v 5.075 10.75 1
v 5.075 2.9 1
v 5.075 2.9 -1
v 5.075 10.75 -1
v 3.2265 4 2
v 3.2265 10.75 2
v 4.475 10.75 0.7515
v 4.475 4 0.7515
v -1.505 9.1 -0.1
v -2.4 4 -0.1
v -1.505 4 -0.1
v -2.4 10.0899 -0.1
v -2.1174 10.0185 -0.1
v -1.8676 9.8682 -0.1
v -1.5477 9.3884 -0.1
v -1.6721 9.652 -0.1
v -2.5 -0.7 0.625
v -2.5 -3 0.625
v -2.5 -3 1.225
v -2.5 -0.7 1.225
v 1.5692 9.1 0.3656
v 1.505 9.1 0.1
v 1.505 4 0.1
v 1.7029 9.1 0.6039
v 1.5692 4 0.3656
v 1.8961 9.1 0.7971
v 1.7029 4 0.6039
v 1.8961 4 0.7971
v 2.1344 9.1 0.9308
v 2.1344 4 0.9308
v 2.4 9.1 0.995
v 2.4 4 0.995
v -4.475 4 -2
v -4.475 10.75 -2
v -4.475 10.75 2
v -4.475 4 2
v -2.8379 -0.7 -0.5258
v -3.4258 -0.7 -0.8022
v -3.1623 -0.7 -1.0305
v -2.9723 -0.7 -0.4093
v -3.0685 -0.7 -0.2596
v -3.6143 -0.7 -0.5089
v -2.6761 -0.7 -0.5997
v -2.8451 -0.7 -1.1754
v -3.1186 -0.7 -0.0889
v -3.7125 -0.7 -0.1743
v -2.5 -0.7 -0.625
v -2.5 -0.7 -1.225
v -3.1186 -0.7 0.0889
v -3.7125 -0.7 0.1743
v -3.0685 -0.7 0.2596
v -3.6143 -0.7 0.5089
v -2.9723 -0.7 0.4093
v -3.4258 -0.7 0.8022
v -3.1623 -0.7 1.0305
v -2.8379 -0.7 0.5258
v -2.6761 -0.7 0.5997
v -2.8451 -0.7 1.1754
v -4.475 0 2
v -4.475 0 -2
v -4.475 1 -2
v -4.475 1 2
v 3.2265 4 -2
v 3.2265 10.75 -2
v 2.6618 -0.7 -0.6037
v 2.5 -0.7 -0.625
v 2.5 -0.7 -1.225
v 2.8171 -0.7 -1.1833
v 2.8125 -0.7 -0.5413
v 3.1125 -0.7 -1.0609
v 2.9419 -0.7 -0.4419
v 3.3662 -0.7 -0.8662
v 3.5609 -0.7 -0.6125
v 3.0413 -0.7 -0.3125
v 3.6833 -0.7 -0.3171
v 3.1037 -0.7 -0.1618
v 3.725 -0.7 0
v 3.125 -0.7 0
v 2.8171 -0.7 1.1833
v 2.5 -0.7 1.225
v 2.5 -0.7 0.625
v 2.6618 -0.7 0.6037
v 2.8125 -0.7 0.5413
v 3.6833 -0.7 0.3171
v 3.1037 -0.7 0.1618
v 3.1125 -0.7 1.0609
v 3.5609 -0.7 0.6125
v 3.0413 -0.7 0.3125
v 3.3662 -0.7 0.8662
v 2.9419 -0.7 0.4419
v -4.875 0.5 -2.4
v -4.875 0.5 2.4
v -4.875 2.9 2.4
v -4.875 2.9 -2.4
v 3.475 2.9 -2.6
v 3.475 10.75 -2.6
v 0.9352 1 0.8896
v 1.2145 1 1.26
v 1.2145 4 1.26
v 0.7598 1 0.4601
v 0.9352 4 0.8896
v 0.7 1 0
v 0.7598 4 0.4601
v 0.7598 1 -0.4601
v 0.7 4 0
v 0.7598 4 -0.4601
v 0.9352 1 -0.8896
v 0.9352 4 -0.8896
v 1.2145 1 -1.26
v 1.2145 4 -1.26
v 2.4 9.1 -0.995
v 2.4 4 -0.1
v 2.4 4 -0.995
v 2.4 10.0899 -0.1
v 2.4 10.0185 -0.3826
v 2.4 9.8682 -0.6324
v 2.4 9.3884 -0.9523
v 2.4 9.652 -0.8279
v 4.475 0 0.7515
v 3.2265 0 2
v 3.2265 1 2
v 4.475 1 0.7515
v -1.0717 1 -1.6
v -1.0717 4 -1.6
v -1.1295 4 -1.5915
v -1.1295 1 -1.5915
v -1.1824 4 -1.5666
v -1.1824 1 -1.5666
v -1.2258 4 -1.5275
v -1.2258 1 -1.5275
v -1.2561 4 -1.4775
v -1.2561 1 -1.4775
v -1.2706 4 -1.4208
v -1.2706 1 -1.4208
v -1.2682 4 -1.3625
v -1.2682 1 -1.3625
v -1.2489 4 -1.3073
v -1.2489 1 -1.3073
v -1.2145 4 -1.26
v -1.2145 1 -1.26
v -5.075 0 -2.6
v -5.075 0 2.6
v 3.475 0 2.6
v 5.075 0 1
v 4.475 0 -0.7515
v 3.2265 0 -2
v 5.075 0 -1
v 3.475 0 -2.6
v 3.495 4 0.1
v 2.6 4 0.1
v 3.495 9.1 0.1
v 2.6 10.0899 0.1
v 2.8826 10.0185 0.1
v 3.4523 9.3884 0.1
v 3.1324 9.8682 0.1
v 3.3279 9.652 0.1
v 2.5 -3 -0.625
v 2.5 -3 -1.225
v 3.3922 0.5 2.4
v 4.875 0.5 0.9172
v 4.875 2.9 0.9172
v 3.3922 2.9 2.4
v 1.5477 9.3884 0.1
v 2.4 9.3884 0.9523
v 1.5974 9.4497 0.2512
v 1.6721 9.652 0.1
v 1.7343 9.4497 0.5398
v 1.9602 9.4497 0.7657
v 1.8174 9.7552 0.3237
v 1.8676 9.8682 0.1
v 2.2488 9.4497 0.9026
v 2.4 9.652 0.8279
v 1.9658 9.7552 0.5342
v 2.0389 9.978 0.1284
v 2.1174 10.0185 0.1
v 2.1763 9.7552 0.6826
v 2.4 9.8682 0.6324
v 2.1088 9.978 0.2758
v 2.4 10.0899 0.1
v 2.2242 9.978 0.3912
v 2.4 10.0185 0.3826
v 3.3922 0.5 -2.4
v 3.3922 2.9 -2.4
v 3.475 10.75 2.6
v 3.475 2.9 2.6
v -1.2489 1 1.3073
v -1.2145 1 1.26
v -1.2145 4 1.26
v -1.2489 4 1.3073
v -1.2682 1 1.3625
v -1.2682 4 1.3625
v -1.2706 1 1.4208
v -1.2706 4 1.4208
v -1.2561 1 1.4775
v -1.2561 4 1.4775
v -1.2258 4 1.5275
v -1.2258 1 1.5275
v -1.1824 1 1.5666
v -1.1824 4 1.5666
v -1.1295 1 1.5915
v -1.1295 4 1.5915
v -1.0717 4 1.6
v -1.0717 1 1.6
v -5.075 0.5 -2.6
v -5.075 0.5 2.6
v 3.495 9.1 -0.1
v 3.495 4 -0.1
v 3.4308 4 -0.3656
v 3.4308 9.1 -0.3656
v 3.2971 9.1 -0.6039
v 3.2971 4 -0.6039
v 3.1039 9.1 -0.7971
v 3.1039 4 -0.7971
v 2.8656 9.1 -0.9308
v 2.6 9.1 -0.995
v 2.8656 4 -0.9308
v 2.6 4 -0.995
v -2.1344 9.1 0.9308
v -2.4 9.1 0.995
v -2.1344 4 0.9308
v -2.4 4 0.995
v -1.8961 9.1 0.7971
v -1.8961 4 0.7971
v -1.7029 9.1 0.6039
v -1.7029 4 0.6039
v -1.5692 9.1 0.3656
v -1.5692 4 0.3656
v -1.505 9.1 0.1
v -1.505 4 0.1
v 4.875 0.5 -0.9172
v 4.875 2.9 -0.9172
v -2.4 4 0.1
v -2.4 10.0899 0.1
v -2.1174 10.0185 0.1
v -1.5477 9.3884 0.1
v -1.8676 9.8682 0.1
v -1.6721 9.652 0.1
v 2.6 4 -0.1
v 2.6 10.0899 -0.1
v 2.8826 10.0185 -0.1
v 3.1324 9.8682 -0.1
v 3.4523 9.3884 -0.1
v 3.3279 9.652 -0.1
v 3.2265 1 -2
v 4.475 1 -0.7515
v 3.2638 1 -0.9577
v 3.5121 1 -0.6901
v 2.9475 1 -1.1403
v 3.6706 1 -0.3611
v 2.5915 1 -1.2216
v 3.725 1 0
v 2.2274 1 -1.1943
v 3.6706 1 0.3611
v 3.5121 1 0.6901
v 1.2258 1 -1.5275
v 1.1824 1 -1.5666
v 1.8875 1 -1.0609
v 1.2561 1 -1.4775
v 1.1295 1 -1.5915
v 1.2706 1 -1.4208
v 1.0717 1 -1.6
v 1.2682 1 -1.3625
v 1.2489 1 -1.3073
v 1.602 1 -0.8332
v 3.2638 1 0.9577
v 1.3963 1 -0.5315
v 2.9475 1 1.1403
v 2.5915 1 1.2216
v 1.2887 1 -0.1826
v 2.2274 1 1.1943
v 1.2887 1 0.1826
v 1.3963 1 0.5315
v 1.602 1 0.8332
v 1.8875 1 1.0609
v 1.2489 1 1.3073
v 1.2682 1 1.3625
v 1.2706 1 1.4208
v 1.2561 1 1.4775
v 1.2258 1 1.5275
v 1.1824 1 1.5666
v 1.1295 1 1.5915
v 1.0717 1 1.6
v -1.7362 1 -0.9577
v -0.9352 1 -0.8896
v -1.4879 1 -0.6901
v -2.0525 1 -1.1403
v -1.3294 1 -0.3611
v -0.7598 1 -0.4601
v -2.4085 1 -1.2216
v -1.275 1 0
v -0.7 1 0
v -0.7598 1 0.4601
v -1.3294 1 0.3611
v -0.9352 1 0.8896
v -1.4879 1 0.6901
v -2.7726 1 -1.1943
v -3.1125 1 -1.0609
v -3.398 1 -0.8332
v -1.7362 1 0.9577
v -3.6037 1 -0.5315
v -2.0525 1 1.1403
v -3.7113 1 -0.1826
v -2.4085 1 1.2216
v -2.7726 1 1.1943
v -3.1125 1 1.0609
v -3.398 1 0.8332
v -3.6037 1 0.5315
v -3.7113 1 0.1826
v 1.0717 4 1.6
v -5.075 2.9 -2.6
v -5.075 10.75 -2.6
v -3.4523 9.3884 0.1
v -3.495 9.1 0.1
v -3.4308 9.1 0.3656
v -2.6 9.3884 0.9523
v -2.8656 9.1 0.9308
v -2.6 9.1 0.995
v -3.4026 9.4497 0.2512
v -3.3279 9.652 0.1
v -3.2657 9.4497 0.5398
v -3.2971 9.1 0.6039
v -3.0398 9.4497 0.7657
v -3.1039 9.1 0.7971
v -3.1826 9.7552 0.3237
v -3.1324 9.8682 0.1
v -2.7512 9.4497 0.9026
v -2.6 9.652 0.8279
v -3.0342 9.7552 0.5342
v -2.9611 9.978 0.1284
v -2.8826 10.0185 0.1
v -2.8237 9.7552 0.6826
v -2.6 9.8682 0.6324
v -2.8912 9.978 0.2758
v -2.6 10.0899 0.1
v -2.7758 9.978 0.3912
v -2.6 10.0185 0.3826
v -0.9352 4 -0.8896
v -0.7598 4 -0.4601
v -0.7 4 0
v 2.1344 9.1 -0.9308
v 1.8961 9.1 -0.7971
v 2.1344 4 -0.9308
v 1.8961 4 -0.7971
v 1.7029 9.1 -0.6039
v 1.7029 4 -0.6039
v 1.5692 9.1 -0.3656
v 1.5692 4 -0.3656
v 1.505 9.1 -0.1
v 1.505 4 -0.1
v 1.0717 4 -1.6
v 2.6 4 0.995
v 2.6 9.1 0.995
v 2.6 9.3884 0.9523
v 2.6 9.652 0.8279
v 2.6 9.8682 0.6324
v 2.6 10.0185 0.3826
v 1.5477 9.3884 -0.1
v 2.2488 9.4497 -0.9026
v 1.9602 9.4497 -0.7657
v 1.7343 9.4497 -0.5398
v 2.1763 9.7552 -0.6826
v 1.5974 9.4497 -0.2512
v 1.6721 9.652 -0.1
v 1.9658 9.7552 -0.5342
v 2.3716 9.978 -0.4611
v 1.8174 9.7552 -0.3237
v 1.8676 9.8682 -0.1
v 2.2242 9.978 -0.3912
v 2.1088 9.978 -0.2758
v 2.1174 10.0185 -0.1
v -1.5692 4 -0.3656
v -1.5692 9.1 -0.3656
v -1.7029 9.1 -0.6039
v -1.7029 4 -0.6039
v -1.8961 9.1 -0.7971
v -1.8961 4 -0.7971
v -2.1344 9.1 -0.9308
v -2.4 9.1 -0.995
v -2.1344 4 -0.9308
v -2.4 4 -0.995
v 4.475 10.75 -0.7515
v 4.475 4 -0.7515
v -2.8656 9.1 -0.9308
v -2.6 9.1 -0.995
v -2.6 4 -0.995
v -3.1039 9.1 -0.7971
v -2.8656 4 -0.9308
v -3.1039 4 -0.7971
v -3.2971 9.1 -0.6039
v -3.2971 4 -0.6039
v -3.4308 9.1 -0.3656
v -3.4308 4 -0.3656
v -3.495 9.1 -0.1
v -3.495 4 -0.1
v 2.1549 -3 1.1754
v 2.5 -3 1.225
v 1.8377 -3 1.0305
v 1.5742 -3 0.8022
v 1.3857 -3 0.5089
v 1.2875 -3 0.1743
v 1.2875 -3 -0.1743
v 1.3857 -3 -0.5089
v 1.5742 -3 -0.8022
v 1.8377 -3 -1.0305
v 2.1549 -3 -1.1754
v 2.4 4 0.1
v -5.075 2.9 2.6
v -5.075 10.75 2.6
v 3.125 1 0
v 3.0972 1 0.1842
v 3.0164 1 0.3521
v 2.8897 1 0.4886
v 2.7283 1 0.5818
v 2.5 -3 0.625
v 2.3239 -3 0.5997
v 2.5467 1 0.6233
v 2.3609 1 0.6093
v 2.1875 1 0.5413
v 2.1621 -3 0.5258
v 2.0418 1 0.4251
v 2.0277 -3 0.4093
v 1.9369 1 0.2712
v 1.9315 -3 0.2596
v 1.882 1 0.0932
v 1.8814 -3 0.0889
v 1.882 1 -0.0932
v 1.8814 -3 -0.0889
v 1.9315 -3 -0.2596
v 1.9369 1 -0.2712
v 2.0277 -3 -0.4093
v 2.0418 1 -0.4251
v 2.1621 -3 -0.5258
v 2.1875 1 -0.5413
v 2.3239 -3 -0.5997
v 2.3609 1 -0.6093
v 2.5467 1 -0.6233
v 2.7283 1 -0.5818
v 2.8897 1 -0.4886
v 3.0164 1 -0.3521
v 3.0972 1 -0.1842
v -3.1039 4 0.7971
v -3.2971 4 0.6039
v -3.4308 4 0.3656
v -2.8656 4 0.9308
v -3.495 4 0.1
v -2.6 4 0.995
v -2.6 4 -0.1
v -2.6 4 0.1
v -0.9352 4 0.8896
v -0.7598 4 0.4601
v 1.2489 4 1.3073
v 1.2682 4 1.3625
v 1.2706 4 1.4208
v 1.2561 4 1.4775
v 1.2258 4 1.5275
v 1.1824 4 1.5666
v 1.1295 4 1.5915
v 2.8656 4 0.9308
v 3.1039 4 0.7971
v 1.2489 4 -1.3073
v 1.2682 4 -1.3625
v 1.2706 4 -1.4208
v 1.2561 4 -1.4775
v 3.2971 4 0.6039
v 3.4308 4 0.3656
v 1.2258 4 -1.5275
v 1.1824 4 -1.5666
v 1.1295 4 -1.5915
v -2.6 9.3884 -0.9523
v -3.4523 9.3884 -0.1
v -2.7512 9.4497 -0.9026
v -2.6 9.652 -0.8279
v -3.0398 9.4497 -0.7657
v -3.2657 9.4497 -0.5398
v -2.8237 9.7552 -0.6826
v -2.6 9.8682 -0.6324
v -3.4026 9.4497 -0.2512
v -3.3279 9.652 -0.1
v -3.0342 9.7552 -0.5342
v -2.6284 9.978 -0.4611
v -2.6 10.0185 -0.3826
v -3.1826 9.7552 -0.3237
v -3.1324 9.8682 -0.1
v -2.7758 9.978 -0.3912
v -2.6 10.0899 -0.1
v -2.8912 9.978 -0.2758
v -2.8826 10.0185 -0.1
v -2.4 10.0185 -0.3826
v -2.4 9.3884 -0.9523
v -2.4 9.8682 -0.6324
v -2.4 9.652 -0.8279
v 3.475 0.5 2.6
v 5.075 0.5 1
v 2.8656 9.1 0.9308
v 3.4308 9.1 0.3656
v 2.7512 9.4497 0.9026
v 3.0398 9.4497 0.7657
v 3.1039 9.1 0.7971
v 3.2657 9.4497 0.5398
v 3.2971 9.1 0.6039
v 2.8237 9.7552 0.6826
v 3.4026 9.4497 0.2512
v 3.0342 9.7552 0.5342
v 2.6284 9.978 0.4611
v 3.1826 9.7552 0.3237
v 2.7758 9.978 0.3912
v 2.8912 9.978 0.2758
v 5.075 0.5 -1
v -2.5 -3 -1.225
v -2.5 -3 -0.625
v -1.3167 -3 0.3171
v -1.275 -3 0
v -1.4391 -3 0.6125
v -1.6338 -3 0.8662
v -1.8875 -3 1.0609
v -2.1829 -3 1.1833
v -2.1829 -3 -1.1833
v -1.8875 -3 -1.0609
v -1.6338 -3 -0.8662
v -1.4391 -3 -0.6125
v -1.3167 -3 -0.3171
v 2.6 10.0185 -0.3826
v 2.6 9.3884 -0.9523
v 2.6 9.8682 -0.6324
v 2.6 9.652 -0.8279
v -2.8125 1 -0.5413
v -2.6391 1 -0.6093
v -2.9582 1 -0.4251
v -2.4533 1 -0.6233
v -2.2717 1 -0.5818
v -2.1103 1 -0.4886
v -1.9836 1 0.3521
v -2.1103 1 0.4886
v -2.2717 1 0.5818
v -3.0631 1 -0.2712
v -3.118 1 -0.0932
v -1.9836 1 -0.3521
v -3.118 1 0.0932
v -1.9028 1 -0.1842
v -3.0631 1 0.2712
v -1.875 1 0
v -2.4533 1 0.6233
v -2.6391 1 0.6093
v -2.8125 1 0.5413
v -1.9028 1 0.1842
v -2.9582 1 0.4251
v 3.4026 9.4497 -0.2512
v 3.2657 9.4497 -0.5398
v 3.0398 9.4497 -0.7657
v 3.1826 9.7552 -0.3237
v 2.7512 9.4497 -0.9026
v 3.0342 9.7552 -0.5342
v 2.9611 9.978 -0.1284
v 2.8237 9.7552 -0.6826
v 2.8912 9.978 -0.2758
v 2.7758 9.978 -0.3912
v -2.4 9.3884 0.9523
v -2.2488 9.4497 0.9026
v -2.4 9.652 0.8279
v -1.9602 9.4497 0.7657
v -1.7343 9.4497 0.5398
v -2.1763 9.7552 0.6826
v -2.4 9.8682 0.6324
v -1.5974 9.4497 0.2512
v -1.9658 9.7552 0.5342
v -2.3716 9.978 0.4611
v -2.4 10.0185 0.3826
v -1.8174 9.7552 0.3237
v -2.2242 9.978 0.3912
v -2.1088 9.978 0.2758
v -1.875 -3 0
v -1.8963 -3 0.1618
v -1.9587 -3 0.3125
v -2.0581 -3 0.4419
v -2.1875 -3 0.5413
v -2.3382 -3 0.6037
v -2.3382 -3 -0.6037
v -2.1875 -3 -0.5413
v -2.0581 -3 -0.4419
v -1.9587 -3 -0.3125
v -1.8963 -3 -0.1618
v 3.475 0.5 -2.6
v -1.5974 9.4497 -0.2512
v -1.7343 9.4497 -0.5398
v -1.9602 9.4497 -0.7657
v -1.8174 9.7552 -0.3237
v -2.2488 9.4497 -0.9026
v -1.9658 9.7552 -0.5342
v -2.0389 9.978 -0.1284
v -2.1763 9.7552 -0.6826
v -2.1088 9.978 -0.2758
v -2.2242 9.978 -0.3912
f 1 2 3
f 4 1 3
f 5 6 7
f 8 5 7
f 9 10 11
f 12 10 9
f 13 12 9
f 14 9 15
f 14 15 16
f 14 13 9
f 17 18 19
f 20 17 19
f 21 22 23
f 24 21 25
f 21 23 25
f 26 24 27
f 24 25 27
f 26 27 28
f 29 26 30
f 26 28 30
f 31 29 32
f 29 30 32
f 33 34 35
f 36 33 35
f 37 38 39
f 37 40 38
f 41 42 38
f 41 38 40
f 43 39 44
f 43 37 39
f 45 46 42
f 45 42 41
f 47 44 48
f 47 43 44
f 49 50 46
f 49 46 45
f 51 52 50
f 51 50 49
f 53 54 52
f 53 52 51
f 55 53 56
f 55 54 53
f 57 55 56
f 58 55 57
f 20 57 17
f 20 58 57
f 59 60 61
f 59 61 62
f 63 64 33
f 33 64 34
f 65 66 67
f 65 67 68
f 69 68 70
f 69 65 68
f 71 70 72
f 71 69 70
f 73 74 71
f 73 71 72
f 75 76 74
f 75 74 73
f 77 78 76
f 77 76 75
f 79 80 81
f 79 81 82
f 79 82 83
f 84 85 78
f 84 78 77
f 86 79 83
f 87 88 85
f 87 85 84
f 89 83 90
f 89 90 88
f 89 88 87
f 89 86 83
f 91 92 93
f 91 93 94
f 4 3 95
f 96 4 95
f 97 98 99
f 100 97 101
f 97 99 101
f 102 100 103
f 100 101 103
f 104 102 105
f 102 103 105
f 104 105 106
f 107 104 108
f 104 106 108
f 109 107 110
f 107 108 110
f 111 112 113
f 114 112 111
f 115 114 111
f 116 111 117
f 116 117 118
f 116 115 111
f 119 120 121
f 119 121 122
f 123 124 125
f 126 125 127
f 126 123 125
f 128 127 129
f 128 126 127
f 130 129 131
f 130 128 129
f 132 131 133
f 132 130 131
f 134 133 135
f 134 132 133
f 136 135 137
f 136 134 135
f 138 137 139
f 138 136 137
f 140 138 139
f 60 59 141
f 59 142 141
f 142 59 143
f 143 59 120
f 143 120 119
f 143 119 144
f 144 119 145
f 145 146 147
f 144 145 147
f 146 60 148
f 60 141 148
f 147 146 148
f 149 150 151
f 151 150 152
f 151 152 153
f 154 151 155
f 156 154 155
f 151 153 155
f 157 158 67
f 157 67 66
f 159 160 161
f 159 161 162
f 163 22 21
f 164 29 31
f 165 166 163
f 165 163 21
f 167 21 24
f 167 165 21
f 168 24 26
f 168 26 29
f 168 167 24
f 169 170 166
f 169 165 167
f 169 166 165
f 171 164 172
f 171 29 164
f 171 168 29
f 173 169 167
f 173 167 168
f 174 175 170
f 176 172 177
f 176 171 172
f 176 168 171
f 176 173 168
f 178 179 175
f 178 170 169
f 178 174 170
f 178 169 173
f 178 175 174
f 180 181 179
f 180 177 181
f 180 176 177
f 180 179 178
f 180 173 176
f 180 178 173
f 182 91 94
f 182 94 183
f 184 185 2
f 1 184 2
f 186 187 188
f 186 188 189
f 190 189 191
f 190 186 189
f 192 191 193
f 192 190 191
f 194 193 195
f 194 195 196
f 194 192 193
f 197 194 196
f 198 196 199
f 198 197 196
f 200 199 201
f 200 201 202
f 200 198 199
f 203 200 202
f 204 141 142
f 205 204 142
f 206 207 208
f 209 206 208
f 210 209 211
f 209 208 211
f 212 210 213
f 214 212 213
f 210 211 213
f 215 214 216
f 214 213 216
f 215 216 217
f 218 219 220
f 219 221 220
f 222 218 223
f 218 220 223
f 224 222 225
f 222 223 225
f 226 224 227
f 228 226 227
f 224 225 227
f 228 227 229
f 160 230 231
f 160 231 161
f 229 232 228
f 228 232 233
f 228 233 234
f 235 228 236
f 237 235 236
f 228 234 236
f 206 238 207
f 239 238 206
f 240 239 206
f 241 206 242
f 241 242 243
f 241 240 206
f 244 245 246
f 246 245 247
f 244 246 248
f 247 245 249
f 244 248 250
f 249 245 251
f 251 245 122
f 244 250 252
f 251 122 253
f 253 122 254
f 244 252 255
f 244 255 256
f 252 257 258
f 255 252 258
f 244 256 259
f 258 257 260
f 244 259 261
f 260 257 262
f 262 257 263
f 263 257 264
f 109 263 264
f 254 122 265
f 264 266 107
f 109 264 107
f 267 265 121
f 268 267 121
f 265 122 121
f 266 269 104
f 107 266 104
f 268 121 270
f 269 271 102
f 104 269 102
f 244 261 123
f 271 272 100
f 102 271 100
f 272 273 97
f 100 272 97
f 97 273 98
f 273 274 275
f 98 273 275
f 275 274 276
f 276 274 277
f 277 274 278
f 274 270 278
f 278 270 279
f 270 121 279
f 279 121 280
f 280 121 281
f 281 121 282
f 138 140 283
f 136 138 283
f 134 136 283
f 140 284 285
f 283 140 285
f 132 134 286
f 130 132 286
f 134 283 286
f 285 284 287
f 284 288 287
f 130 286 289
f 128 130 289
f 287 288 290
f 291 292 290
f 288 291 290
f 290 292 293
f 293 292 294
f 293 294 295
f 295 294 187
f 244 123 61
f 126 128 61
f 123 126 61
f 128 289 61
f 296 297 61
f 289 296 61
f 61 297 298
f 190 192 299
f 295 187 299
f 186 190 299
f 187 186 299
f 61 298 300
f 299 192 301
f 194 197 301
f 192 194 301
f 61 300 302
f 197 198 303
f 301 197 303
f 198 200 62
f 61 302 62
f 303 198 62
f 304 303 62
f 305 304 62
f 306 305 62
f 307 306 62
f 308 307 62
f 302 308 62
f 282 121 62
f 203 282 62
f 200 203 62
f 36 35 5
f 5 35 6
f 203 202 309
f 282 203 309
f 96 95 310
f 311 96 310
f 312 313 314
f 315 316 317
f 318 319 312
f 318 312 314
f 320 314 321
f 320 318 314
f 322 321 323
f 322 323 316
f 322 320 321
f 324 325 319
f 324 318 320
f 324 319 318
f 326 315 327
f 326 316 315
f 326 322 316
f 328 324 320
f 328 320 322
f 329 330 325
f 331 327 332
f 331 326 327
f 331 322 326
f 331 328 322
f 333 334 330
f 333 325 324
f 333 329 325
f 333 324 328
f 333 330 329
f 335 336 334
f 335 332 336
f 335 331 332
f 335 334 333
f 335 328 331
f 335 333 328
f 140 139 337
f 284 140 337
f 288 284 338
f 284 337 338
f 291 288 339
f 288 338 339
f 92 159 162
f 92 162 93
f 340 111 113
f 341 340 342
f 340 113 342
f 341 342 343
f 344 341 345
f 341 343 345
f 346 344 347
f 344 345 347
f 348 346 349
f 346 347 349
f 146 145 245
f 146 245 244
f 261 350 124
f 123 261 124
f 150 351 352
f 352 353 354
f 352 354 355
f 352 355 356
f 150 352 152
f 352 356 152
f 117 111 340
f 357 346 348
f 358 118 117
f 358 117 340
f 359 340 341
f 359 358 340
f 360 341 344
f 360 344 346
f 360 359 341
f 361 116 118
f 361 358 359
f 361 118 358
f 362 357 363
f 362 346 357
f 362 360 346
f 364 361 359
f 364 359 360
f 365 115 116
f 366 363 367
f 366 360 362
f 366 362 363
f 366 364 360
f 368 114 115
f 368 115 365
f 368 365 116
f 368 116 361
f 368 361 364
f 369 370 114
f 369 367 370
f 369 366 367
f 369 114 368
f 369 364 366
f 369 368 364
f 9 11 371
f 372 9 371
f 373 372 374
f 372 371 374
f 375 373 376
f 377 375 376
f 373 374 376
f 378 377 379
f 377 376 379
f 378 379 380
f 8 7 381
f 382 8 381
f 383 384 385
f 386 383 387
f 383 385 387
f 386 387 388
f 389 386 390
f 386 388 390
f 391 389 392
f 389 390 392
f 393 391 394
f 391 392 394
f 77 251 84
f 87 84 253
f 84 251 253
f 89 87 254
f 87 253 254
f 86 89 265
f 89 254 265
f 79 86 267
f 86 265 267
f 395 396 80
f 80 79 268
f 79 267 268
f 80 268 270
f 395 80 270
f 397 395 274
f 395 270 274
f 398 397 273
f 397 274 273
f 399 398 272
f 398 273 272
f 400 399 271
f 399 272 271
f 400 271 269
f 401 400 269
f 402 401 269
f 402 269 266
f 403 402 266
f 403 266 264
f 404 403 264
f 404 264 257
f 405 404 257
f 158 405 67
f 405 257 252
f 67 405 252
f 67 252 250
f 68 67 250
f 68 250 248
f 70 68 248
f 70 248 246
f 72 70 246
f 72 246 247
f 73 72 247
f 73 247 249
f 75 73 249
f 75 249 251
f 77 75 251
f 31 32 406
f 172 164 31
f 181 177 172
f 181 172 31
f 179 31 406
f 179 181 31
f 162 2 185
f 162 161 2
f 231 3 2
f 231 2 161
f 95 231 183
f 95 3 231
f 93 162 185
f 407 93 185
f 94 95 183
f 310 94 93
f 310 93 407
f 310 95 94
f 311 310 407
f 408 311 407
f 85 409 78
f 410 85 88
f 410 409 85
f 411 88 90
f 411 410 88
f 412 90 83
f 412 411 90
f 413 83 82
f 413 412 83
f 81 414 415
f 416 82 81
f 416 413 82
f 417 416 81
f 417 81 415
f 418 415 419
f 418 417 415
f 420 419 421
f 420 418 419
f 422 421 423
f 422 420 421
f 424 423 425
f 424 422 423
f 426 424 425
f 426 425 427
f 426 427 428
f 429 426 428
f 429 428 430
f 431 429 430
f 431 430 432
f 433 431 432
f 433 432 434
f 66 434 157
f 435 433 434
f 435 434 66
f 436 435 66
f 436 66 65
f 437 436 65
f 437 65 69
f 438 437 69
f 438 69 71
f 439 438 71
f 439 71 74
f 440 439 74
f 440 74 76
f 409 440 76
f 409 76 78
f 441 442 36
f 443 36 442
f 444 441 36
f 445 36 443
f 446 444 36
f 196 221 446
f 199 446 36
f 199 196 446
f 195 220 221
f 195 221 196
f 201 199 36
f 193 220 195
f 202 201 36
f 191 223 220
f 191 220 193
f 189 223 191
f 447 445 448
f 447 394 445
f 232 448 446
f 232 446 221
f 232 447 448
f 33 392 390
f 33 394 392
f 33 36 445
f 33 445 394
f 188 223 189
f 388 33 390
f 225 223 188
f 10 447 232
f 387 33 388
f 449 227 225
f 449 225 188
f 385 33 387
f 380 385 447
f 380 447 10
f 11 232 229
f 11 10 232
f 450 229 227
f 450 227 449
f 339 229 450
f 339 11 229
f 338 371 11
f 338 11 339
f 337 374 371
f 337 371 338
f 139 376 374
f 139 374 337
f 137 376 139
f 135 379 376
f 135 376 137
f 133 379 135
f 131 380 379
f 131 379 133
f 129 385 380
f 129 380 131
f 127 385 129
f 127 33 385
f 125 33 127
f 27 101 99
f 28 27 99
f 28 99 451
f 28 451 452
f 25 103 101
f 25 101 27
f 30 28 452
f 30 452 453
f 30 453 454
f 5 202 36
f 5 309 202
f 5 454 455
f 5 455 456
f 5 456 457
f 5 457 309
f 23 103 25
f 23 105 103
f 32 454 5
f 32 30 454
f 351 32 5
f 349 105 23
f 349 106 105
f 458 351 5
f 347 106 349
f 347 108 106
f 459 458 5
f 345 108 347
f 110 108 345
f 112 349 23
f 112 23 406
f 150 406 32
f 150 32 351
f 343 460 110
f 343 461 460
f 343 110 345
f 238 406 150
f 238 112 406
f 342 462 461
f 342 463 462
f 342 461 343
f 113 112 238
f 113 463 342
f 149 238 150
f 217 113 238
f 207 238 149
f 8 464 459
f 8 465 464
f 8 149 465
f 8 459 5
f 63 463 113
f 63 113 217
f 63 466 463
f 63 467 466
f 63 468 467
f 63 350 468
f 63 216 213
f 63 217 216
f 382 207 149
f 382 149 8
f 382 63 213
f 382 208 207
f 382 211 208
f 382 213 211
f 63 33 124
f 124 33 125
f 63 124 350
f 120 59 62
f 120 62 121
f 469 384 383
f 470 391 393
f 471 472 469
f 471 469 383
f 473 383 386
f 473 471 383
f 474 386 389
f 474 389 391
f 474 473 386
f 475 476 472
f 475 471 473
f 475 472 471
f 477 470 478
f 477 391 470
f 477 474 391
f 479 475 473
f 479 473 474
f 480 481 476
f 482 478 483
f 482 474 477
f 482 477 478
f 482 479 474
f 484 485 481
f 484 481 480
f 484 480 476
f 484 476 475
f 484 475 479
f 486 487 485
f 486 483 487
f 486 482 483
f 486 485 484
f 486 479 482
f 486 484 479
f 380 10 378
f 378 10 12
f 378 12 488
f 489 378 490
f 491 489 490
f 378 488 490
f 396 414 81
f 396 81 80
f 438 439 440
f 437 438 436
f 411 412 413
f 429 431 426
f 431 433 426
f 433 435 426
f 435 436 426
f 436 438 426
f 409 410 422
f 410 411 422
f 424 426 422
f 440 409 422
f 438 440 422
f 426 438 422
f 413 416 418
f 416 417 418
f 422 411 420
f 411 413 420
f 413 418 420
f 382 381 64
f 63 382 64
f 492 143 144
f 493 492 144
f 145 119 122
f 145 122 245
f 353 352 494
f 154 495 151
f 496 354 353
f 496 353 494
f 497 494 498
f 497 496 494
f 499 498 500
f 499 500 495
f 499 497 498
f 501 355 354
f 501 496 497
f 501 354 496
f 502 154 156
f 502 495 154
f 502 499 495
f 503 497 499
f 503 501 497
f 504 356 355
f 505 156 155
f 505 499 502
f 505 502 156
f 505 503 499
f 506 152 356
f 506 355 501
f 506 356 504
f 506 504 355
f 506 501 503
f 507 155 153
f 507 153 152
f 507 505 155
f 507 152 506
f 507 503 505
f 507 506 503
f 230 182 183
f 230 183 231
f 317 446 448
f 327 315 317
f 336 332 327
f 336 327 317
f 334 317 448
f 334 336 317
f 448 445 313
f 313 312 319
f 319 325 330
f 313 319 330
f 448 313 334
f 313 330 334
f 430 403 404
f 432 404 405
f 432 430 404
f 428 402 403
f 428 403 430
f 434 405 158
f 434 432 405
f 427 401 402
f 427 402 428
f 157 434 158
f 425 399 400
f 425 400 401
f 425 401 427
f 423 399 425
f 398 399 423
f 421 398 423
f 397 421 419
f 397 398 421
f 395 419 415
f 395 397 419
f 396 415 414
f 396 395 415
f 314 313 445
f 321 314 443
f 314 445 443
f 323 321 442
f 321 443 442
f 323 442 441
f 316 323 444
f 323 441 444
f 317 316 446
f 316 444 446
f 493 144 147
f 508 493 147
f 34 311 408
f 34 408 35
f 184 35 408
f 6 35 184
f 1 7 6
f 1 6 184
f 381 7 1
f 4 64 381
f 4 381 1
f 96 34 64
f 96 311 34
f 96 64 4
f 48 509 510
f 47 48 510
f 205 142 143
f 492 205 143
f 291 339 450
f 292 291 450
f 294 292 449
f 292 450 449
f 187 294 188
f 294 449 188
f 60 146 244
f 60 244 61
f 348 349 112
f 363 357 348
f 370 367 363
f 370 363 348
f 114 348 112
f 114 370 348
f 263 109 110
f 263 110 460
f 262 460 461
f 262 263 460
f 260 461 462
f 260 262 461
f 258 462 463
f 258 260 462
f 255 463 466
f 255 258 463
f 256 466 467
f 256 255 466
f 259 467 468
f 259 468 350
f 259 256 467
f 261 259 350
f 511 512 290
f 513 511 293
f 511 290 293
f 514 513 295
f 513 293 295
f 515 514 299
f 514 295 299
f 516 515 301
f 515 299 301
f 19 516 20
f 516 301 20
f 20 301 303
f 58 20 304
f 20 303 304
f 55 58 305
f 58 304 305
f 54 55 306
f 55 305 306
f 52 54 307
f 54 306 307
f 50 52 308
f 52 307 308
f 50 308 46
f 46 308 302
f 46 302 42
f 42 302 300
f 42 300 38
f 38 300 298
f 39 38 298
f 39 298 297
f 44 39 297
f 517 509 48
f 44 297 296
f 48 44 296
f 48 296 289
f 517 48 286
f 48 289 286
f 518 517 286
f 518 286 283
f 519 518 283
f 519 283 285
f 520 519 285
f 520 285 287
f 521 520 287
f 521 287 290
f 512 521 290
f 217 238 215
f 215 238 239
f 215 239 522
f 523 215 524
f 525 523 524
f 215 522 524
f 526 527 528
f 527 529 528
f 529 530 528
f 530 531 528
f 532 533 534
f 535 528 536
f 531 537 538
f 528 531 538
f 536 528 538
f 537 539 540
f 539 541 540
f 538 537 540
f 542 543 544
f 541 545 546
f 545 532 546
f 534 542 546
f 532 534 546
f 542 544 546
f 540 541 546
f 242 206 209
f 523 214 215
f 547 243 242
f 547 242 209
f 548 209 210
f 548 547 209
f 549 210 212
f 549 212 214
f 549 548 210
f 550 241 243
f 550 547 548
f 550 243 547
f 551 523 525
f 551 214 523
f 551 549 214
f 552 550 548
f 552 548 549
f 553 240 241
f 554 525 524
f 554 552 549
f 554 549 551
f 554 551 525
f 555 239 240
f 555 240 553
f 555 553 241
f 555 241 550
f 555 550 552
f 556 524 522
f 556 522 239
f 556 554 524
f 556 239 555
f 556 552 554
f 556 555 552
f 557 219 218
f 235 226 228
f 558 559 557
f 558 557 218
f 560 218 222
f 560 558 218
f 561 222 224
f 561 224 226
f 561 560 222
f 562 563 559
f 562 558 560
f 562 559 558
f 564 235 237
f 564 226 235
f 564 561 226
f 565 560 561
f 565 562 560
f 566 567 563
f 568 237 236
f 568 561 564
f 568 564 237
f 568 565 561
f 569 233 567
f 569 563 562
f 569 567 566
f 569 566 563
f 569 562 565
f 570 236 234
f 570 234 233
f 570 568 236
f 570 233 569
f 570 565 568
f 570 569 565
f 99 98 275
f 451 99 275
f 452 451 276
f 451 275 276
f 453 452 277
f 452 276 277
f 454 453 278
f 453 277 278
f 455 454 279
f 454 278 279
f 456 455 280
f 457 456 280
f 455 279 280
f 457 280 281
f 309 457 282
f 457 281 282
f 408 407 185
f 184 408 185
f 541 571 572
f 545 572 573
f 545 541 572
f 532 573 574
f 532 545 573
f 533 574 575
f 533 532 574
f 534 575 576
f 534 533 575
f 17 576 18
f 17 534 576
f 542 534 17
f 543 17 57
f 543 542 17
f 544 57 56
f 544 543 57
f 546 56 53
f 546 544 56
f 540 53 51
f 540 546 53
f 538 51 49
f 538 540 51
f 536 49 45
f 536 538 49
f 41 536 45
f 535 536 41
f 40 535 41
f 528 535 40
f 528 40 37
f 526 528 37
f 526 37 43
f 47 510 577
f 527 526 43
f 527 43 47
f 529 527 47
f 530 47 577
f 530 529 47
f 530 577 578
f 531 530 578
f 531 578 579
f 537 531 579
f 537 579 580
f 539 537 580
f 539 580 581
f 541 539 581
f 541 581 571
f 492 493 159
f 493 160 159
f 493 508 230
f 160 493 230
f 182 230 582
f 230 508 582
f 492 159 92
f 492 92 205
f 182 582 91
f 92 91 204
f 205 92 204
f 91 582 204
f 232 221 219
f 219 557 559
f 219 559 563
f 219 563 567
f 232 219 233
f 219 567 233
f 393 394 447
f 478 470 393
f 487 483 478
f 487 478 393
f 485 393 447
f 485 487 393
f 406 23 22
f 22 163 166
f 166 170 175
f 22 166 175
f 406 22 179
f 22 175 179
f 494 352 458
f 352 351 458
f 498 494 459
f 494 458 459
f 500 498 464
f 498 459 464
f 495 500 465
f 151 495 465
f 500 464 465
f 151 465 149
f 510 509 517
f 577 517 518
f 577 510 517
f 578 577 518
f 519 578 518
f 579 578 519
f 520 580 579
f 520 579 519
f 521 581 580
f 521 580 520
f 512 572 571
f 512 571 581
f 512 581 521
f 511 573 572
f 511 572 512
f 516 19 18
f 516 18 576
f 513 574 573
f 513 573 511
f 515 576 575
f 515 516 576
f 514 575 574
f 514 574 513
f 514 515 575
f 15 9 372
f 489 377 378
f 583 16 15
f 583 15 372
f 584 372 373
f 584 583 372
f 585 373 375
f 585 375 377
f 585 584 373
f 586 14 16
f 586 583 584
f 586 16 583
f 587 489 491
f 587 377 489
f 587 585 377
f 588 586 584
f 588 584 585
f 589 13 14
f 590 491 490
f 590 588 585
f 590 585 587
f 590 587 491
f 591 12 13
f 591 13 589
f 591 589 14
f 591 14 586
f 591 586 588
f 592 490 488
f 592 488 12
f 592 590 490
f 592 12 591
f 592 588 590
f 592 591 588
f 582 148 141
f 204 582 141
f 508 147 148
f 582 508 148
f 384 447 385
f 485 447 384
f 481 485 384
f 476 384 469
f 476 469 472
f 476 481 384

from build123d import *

# Parameters (mm, degrees)
SHAPE_DEPTH         = 10.75
CUT_EXTRUDE1_DEPTH  = 6.75
CUT_EXTRUDE2_REACH  = 6
FILLET1_R           = 0.2
SKETCH4_R           = 1
BOSS_EXTRUDE2_DEPTH = 6.1
FILLET2_R           = 1
SKETCH5_W           = 0.2
SKETCH5_H           = 2
SKETCH5_W_2         = 2
SKETCH5_H_2         = 0.2
CUT_EXTRUDE3_DEPTH  = 6.75
CUT_EXTRUDE4_DEPTH  = 2.4
CUT_EXTRUDE5_DEPTH  = 1
SKETCH7_R           = 1.225
SKETCH7_R_2         = 0.625
BOSS_EXTRUDE3_DEPTH = 4
SKETCH9_W           = 1.225
SKETCH9_H           = 2.45
CUT_EXTRUDE6_DEPTH  = 2.3


with BuildPart() as part:
    # Sketch1 → Shape (new body)
    with BuildSketch(Plane(origin=(0, 0, 0), x_dir=(1, 0, 0), z_dir=(0, 1, 0))):
        Polygon((5.075, -1), (5.075, 1), (3.475, 2.6), (-5.075, 2.6), (-5.075, -2.6), (3.475, -2.6), align=None)
    extrude(amount=SHAPE_DEPTH)

    # Sketch2 → Cut-Extrude1 (cut)
    with BuildSketch(Plane(origin=(0, 10.75, 0), x_dir=(1, 0, 0), z_dir=(0, 1, 0))):
        Polygon((3.226471863, -2), (4.475, -0.751471863), (4.475, 0.751471863), (3.226471863, 2), (-4.475, 2), (-4.475, -2), align=None)
    extrude(amount=-CUT_EXTRUDE1_DEPTH, mode=Mode.SUBTRACT)

    # Sketch3 → Cut-Extrude2 (cut, up to next)
    with BuildSketch(Plane(origin=(0, 4, 0), x_dir=(1, 0, 0), z_dir=(0, 1, 0)), mode=Mode.PRIVATE) as cut_extrude2_sk1:
        with BuildLine():
            Line((-1.675378875, -1.6), (1.675378875, -1.6))
            ThreePointArc((1.675378875, -1.6), (0.7, 0), (1.675378875, 1.6))
            Line((1.675378875, 1.6), (-1.675378875, 1.6))
            ThreePointArc((-1.675378875, 1.6), (-0.963068312, 0.936931688), (-0.7, 0))
            ThreePointArc((-0.7, 0), (-0.963068312, -0.936931688), (-1.675378875, -1.6))
        make_face()
    cut_extrude2_tool1 = extrude(cut_extrude2_sk1.sketch, amount=-CUT_EXTRUDE2_REACH, mode=Mode.PRIVATE) & part.part
    add(cut_extrude2_tool1.solids().sort_by_distance((0, 4, 0))[0], mode=Mode.SUBTRACT)

    # Fillet1
    fillet1_edges = [part.edges().sort_by_distance(p)[0] for p in [
        (1.675378875, 2, 1.6),
        (-1.675378875, 2, 1.6),
        (-1.675378875, 2, -1.6),
        (1.675378875, 2, -1.6),
    ]]
    fillet(fillet1_edges, radius=FILLET1_R)

    # Sketch4 → Boss-Extrude2 (add)
    with BuildSketch(Plane(origin=(0, 4, 0), x_dir=(1, 0, 0), z_dir=(0, 1, 0))):
        with Locations((-2.5, 0)):
            Circle(SKETCH4_R)
        with Locations((2.5, 0)):
            Circle(SKETCH4_R)
    extrude(amount=BOSS_EXTRUDE2_DEPTH)

    # Fillet2
    fillet2_edges = [part.edges().sort_by_distance(p)[0] for p in [
        (-3.5, 10.1, 0),
        (1.5, 10.1, 0),
    ]]
    fillet(fillet2_edges, radius=FILLET2_R)

    # Sketch5 → Cut-Extrude3 (cut)
    with BuildSketch(Plane(origin=(0, 10.75, 0), x_dir=(1, 0, 0), z_dir=(0, 1, 0))):
        with Locations((-2.5, 0)):
            Rectangle(SKETCH5_W, SKETCH5_H)
        with Locations((-2.5, 0)):
            Rectangle(SKETCH5_W_2, SKETCH5_H_2)
        with Locations((2.5, 0)):
            Rectangle(SKETCH5_W_2, SKETCH5_H_2)
        with Locations((2.5, 0)):
            Rectangle(SKETCH5_W, SKETCH5_H)
    extrude(amount=-CUT_EXTRUDE3_DEPTH, mode=Mode.SUBTRACT)

    # Sketch6 → Cut-Extrude4 (cut)
    with BuildSketch(Plane(origin=(0, 0.5, 0), x_dir=(-1, 0, 0), z_dir=(0, -1, 0))):
        Polygon((-5.075, -1), (-3.475, -2.6), (5.075, -2.6), (5.075, 2.6), (-3.475, 2.6), (-5.075, 1), align=None)
        Polygon((-4.875, -0.917157288), (-3.392157288, -2.4), (4.875, -2.4), (4.875, 2.4), (-3.392157288, 2.4), (-4.875, 0.917157288), align=None, mode=Mode.SUBTRACT)
    extrude(amount=-CUT_EXTRUDE4_DEPTH, mode=Mode.SUBTRACT)

    # Sketch8 → Cut-Extrude5 (cut)
    with BuildSketch(Plane.XZ):
        Polygon((-4.475, -2), (-4.475, 2), (3.226471863, 2), (4.475, 0.751471863), (4.475, -0.751471863), (3.226471863, -2), align=None)
    extrude(amount=-CUT_EXTRUDE5_DEPTH, mode=Mode.SUBTRACT)

    # Sketch7 → Boss-Extrude3 (add)
    with BuildSketch(Plane.XZ.offset(-1)):
        with Locations((-2.5, 0)):
            Circle(SKETCH7_R)
        with Locations((-2.5, 0)):
            Circle(SKETCH7_R_2, mode=Mode.SUBTRACT)
        with Locations((2.5, 0)):
            Circle(SKETCH7_R)
        with Locations((2.5, 0)):
            Circle(SKETCH7_R_2, mode=Mode.SUBTRACT)
    extrude(amount=BOSS_EXTRUDE3_DEPTH)

    # Sketch9 → Cut-Extrude6 (cut)
    with BuildSketch(Plane.XZ.offset(3)):
        with Locations((-3.1125, 0)):
            Rectangle(SKETCH9_W, SKETCH9_H)
        with Locations((3.1125, 0)):
            Rectangle(SKETCH9_W, SKETCH9_H)
    extrude(amount=-CUT_EXTRUDE6_DEPTH, mode=Mode.SUBTRACT)


solid = part.part
